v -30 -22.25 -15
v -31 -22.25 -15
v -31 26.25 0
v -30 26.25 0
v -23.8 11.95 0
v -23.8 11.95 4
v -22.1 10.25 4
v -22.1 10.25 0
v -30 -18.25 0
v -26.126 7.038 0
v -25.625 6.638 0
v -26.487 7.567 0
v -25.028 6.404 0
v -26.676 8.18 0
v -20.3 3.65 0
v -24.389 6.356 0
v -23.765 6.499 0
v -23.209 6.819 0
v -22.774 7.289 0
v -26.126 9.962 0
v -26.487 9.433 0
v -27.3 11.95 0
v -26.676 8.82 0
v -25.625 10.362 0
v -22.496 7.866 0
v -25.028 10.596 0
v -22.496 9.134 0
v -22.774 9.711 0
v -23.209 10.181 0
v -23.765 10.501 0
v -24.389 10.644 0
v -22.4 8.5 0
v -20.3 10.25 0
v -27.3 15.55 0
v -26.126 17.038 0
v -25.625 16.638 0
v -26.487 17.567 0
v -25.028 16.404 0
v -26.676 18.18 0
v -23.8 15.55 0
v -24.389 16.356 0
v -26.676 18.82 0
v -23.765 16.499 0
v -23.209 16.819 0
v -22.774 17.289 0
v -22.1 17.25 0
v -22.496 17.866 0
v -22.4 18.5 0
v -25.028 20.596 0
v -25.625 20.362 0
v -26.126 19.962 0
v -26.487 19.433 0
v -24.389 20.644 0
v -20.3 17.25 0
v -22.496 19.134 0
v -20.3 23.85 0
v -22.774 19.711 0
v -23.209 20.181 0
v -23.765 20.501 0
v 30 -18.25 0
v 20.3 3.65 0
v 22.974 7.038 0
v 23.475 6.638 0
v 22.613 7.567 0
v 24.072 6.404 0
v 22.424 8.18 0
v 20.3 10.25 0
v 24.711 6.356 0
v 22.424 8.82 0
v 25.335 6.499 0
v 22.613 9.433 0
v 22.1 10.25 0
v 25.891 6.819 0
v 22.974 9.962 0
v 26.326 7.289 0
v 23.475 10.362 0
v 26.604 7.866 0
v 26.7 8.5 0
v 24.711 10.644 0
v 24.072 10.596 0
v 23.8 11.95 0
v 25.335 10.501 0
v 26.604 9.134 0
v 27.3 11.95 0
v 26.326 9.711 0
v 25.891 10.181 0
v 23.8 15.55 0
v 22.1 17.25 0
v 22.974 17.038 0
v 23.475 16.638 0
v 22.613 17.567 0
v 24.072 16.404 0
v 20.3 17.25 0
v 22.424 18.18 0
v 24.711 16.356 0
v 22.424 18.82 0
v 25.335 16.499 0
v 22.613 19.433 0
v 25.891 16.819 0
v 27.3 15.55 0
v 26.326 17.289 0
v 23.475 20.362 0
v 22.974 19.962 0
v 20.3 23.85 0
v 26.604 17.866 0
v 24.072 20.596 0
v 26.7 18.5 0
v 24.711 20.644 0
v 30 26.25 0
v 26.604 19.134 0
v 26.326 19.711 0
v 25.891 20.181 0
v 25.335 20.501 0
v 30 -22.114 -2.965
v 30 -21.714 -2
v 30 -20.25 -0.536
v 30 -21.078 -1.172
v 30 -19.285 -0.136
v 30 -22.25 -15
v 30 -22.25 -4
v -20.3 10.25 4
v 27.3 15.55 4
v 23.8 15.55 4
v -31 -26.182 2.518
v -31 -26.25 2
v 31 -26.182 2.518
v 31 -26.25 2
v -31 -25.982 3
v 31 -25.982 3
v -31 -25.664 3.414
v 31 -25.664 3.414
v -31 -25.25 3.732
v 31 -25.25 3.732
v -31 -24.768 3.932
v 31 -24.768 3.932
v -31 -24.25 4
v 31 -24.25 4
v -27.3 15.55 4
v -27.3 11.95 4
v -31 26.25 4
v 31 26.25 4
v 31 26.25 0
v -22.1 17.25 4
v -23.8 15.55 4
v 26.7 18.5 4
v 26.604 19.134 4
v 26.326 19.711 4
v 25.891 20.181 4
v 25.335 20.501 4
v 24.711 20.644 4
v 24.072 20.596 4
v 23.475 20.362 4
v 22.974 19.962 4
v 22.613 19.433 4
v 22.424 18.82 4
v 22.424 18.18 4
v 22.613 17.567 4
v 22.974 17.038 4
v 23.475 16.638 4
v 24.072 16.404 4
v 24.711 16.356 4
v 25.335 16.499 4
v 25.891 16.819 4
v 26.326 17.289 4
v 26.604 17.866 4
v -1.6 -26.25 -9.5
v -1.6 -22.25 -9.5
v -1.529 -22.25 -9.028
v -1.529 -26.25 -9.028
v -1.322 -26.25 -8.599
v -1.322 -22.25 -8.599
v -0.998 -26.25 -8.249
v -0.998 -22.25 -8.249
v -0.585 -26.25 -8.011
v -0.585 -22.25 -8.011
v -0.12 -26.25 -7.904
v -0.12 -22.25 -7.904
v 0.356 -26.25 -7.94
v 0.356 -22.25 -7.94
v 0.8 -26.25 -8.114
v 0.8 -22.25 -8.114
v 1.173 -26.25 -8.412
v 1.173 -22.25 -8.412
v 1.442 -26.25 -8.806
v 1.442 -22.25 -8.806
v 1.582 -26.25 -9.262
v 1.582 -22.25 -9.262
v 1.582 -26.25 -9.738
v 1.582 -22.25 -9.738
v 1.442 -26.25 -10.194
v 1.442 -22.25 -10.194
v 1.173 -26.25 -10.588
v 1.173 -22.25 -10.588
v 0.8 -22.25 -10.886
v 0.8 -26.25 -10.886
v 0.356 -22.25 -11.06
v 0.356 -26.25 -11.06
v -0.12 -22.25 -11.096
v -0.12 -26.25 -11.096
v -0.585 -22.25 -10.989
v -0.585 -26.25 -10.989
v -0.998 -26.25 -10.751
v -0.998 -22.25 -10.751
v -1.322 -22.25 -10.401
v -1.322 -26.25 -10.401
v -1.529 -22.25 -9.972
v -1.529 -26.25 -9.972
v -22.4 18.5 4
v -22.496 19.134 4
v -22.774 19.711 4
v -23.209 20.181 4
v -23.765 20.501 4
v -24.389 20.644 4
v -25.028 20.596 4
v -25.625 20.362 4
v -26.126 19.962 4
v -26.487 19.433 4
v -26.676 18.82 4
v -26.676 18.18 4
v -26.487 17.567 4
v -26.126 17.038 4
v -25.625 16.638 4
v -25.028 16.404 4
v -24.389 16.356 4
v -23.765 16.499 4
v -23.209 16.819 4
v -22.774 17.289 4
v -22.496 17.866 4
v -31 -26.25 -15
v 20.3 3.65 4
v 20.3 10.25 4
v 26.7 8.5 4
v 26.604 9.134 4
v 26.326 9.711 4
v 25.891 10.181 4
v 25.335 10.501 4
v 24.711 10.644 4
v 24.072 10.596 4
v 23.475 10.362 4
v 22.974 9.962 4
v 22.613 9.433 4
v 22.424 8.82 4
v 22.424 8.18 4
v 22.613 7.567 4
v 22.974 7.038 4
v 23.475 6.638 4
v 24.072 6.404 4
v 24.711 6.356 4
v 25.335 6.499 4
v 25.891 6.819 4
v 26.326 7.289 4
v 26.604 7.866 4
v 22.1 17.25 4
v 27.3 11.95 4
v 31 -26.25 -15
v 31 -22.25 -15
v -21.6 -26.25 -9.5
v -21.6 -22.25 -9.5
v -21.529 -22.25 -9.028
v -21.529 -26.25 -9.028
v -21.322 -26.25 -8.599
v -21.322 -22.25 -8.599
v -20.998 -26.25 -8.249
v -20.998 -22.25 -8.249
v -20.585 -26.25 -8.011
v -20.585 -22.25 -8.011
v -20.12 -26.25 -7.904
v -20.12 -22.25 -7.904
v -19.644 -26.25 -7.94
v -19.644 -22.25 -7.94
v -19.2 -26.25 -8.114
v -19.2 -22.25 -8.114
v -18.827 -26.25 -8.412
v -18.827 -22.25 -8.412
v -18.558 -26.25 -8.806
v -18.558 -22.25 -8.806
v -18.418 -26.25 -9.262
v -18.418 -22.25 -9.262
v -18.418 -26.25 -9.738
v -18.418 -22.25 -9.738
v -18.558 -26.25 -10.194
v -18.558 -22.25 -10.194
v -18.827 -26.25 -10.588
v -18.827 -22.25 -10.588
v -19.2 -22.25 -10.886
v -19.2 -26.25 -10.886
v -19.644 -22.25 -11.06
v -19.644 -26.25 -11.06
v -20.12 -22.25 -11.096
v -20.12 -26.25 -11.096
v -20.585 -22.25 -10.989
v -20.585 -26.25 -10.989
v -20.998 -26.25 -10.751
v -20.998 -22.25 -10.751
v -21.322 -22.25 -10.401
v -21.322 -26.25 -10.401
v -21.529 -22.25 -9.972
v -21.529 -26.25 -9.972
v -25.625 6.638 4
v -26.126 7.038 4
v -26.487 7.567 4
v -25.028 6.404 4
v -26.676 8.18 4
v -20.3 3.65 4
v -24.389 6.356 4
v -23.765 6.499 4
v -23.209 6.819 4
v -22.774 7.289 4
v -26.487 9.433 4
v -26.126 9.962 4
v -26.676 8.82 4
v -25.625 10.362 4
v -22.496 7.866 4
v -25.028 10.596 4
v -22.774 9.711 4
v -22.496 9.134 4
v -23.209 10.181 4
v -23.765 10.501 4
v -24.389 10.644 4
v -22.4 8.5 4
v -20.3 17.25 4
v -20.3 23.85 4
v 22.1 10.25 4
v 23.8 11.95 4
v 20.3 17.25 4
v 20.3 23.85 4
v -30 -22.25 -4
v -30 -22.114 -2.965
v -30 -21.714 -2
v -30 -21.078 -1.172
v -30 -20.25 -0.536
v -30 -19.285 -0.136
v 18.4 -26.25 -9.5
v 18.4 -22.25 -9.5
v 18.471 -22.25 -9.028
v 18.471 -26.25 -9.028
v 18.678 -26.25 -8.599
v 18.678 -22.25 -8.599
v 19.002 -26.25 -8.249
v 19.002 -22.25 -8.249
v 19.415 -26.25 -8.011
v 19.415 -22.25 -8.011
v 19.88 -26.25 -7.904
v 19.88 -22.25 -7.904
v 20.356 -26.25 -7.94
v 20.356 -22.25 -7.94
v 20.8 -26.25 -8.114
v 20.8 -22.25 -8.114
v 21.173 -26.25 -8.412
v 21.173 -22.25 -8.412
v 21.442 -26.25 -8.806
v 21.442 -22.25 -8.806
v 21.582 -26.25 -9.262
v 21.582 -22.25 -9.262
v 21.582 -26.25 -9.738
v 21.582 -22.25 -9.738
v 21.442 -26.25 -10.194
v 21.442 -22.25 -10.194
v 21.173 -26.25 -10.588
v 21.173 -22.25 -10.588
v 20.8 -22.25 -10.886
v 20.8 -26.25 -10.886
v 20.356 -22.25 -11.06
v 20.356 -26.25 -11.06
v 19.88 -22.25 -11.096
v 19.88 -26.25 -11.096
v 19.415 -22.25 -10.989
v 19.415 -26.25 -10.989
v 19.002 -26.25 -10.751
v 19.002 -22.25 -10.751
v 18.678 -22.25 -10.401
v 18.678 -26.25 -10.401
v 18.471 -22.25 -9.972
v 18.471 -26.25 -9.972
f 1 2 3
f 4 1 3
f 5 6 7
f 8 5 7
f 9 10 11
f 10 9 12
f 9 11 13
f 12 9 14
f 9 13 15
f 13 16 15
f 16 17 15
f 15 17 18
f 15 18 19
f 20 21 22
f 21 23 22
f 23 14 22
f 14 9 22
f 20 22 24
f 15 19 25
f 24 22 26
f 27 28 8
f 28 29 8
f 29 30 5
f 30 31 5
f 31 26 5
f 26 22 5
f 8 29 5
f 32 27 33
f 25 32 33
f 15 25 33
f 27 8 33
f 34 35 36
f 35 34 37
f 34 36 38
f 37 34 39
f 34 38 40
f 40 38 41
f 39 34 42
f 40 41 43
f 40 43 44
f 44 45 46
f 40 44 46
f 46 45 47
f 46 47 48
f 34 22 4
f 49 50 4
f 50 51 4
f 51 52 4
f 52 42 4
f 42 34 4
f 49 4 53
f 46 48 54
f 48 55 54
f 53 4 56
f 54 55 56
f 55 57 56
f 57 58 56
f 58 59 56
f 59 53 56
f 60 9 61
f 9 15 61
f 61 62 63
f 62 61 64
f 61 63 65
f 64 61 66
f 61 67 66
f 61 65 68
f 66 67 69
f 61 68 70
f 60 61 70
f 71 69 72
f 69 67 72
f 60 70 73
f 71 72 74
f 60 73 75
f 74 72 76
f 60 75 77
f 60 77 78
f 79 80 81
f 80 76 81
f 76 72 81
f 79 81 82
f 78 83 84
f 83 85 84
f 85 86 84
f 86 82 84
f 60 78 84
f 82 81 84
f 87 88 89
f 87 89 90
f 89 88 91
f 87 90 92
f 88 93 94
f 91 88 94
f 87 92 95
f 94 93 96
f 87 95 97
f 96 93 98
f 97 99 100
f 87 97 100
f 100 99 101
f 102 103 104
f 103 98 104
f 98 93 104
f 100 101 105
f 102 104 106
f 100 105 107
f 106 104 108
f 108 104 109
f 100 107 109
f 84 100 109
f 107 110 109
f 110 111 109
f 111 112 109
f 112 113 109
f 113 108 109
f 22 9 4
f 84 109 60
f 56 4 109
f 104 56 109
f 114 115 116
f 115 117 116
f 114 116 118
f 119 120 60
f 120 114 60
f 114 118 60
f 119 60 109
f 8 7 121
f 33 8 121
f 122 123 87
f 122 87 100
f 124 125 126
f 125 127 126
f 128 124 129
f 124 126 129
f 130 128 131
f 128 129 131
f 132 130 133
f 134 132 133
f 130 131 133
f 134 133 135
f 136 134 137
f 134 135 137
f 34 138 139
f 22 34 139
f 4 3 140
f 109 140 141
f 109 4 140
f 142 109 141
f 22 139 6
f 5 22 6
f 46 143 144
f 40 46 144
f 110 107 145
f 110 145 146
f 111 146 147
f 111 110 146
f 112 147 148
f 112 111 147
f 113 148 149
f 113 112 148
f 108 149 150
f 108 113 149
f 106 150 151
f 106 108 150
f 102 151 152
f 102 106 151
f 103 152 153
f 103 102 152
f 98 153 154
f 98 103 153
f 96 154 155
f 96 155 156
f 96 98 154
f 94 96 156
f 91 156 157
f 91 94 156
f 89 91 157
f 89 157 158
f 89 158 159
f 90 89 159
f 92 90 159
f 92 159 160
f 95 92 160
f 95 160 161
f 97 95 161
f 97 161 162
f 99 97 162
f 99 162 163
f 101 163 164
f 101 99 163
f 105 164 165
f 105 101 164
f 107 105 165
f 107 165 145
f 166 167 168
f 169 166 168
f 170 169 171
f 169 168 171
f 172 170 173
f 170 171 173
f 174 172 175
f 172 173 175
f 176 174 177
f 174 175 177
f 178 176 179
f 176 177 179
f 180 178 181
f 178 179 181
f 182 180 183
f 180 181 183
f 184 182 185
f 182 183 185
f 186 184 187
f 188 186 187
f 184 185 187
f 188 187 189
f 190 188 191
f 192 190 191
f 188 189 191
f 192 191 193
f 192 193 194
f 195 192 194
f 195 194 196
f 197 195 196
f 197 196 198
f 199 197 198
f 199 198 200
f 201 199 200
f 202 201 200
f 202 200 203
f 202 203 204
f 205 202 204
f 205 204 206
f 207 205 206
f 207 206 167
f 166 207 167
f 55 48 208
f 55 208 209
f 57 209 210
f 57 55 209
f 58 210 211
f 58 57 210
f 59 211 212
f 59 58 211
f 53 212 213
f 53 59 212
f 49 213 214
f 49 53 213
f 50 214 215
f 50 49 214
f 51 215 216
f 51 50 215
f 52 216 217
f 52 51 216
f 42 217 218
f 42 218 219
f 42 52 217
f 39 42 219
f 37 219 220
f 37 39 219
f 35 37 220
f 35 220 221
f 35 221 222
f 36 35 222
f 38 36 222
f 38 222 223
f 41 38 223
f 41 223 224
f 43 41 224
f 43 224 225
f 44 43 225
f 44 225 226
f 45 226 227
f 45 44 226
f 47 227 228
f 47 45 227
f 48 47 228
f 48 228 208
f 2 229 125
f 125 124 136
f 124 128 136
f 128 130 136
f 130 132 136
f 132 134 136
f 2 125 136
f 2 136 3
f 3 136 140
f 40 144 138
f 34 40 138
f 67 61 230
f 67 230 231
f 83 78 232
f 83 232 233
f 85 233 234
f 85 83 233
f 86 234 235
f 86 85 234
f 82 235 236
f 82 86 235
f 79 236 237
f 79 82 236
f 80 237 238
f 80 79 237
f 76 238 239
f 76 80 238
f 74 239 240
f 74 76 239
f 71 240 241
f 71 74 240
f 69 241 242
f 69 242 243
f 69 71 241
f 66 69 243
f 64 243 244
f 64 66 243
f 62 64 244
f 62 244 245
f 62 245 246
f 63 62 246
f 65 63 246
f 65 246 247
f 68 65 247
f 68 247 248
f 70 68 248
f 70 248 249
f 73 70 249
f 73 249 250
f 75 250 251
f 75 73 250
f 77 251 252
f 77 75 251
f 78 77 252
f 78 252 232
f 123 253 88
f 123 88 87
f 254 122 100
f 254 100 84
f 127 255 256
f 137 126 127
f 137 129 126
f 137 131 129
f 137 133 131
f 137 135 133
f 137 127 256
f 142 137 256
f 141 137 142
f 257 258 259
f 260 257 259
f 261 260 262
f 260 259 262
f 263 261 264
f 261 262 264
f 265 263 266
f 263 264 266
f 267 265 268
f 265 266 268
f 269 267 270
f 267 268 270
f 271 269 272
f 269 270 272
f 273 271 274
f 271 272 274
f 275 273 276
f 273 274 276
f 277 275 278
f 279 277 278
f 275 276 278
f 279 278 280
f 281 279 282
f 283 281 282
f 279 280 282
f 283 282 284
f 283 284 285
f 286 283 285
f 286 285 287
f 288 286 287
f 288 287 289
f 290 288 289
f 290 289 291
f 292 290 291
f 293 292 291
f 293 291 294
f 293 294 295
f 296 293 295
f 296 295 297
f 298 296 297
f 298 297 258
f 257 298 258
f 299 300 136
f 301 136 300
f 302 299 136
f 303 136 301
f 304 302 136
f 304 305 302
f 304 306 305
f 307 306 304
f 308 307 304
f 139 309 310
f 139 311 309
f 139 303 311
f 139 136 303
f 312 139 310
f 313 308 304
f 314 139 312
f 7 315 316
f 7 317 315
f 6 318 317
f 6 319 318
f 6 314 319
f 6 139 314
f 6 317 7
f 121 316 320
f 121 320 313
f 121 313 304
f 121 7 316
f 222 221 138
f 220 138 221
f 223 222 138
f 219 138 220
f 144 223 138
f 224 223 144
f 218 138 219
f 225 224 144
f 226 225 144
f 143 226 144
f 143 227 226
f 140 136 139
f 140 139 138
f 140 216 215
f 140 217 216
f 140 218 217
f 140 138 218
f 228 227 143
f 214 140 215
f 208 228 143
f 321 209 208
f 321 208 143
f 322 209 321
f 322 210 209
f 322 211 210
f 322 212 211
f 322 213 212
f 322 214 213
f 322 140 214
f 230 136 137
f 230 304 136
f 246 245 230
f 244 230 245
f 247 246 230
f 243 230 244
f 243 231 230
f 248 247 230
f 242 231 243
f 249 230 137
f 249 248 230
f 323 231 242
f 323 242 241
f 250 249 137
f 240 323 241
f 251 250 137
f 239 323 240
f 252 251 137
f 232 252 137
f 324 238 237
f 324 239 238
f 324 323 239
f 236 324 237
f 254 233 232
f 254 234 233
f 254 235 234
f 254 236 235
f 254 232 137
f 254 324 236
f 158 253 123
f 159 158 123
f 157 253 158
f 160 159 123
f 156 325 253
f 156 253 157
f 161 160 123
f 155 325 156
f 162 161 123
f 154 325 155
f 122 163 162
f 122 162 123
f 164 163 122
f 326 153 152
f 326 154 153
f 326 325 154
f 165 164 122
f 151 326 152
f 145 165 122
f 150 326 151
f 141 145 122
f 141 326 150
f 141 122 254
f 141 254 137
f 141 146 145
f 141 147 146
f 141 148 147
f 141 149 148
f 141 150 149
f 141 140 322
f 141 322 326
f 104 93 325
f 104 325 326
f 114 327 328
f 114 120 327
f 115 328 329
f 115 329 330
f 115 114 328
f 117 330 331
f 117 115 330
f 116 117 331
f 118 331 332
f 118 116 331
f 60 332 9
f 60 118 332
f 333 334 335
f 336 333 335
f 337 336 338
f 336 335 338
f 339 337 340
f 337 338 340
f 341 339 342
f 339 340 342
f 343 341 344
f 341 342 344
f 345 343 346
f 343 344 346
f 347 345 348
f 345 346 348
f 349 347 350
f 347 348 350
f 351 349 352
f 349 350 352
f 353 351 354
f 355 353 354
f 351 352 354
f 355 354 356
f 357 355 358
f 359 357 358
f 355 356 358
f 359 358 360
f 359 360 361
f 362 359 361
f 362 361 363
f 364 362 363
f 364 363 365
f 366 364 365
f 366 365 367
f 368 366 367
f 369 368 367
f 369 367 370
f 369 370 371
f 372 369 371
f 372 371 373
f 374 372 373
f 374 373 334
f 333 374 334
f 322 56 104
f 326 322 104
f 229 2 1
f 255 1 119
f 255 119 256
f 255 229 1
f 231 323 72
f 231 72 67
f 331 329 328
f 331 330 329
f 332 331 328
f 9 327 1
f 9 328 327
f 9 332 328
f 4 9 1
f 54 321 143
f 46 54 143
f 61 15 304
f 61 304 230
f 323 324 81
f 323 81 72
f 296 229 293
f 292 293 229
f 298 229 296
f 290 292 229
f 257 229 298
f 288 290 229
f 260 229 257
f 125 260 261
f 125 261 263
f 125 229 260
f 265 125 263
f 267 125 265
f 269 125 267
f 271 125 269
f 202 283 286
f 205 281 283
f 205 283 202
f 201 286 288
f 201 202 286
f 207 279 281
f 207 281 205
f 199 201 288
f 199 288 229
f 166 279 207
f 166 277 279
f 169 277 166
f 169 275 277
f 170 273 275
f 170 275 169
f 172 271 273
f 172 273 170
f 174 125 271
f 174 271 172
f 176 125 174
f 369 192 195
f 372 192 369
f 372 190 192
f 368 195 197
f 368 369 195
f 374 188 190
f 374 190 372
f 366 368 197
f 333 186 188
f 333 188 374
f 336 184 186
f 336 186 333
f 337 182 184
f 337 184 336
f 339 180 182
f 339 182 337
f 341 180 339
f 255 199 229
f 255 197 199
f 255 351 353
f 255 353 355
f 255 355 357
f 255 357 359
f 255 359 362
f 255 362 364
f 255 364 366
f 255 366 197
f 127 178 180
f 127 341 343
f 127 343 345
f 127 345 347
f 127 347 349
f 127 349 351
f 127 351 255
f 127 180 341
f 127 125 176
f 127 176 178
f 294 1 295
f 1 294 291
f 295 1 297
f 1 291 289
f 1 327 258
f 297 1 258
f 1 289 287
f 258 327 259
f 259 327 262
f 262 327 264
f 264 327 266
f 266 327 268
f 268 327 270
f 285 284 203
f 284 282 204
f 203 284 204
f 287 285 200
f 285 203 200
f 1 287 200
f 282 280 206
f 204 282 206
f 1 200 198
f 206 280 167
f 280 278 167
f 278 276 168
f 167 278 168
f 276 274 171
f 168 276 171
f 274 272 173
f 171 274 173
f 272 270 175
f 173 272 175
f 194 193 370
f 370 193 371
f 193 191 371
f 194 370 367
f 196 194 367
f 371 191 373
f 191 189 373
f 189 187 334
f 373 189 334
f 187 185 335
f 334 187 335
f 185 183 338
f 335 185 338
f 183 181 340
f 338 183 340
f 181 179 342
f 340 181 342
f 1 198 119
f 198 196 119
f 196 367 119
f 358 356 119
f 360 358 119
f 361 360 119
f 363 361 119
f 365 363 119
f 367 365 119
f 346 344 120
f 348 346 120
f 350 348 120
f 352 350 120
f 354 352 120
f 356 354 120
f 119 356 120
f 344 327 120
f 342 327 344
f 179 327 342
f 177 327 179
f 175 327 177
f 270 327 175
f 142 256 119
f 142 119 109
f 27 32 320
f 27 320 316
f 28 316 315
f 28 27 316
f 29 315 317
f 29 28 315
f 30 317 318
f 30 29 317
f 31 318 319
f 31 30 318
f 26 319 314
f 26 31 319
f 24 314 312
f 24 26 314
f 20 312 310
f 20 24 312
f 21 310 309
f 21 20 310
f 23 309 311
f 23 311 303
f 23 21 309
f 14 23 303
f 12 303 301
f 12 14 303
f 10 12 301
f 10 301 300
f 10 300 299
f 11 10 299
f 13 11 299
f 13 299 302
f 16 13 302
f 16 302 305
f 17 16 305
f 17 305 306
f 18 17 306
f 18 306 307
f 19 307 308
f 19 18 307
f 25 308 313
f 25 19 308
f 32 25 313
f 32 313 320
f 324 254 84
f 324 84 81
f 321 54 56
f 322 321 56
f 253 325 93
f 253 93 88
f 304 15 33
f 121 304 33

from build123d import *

# Parameters (mm, degrees)
SKETCH_W        = 62
SKETCH_H        = 52.5
SKETCH_R        = 2.15
SKETCH_W_2      = 40.6
SKETCH_H_2      = 20.2
PAD_DEPTH       = 4
SKETCH001_W     = 62
SKETCH001_H     = 4
PAD001_DEPTH    = 15
PAD002_DEPTH    = 1
FILLET_R        = 4
SKETCH003_R     = 1.6
POCKET_DEPTH    = 4.001
POCKET001_DEPTH = 19.001
FILLET001_R     = 2


with BuildPart() as part:
    # Sketch → Pad (new body)
    with BuildSketch(Plane.XY):
        Rectangle(SKETCH_W, SKETCH_H)
        with Locations((-24.55, 18.5)):
            Circle(SKETCH_R, mode=Mode.SUBTRACT)
        with Locations((-24.55, 8.5)):
            Circle(SKETCH_R, mode=Mode.SUBTRACT)
        with Locations((24.55, 18.5)):
            Circle(SKETCH_R, mode=Mode.SUBTRACT)
        with Locations((24.55, 8.5)):
            Circle(SKETCH_R, mode=Mode.SUBTRACT)
        with Locations((0, 13.75)):
            Rectangle(SKETCH_W_2, SKETCH_H_2, mode=Mode.SUBTRACT)
    extrude(amount=PAD_DEPTH)

    # Sketch001 (on Face13 of Pad) → Pad001 (join)
    with BuildSketch(Plane(origin=(0, 0, 0), x_dir=(1, 0, 0), z_dir=(0, 0, -1))):
        with Locations((0, 24.25)):
            Rectangle(SKETCH001_W, SKETCH001_H)
    extrude(amount=PAD001_DEPTH)

    # Sketch002 (on Face16 of Pad001) → Pad002 (join)
    with BuildSketch(Plane.YZ.offset(31)):
        Polygon((-22.25, 0), (-22.25, -15), (26.25, 0), align=None)
    pad002 = extrude(amount=-PAD002_DEPTH)

    # Mirrored: Pad002 across YZ
    add(pad002.mirror(Plane.YZ))

    # Fillet
    fillet_edges = [part.edges().sort_by_distance(p)[0] for p in [
        (0, -22.25, 0),
    ]]
    fillet(fillet_edges, radius=FILLET_R)

    # Sketch003 (on Face14 of Fillet) → Pocket (cut, through all)
    with BuildSketch(Plane(origin=(0, -22.25, 0), x_dir=(-1, 0, 0), z_dir=(0, 1, 0))):
        with Locations((-20, -9.5)):
            Circle(SKETCH003_R)
        with Locations((20, -9.5)):
            Circle(SKETCH003_R)
        with Locations((0, -9.5)):
            Circle(SKETCH003_R)
    extrude(amount=-POCKET_DEPTH, mode=Mode.SUBTRACT)

    # Sketch005 (on Face19 of Pocket) → Pocket001 (cut, through all)
    with BuildSketch(Plane.XY.offset(4)):
        Polygon((-20.3, 17.25), (-22.1, 17.25), (-23.8, 15.55), (-27.3, 15.55), (-27.3, 11.95), (-23.8, 11.95), (-22.1, 10.25), (-20.3, 10.25), align=None)
        Polygon((20.3, 17.25), (22.1, 17.25), (23.8, 15.55), (27.3, 15.55), (27.3, 11.95), (23.8, 11.95), (22.1, 10.25), (20.3, 10.25), align=None)
    extrude(amount=-POCKET001_DEPTH, mode=Mode.SUBTRACT)

    # Fillet001
    fillet001_edges = [part.edges().sort_by_distance(p)[0] for p in [
        (0, -26.25, 4),
    ]]
    fillet(fillet001_edges, radius=FILLET001_R)


solid = part.part
